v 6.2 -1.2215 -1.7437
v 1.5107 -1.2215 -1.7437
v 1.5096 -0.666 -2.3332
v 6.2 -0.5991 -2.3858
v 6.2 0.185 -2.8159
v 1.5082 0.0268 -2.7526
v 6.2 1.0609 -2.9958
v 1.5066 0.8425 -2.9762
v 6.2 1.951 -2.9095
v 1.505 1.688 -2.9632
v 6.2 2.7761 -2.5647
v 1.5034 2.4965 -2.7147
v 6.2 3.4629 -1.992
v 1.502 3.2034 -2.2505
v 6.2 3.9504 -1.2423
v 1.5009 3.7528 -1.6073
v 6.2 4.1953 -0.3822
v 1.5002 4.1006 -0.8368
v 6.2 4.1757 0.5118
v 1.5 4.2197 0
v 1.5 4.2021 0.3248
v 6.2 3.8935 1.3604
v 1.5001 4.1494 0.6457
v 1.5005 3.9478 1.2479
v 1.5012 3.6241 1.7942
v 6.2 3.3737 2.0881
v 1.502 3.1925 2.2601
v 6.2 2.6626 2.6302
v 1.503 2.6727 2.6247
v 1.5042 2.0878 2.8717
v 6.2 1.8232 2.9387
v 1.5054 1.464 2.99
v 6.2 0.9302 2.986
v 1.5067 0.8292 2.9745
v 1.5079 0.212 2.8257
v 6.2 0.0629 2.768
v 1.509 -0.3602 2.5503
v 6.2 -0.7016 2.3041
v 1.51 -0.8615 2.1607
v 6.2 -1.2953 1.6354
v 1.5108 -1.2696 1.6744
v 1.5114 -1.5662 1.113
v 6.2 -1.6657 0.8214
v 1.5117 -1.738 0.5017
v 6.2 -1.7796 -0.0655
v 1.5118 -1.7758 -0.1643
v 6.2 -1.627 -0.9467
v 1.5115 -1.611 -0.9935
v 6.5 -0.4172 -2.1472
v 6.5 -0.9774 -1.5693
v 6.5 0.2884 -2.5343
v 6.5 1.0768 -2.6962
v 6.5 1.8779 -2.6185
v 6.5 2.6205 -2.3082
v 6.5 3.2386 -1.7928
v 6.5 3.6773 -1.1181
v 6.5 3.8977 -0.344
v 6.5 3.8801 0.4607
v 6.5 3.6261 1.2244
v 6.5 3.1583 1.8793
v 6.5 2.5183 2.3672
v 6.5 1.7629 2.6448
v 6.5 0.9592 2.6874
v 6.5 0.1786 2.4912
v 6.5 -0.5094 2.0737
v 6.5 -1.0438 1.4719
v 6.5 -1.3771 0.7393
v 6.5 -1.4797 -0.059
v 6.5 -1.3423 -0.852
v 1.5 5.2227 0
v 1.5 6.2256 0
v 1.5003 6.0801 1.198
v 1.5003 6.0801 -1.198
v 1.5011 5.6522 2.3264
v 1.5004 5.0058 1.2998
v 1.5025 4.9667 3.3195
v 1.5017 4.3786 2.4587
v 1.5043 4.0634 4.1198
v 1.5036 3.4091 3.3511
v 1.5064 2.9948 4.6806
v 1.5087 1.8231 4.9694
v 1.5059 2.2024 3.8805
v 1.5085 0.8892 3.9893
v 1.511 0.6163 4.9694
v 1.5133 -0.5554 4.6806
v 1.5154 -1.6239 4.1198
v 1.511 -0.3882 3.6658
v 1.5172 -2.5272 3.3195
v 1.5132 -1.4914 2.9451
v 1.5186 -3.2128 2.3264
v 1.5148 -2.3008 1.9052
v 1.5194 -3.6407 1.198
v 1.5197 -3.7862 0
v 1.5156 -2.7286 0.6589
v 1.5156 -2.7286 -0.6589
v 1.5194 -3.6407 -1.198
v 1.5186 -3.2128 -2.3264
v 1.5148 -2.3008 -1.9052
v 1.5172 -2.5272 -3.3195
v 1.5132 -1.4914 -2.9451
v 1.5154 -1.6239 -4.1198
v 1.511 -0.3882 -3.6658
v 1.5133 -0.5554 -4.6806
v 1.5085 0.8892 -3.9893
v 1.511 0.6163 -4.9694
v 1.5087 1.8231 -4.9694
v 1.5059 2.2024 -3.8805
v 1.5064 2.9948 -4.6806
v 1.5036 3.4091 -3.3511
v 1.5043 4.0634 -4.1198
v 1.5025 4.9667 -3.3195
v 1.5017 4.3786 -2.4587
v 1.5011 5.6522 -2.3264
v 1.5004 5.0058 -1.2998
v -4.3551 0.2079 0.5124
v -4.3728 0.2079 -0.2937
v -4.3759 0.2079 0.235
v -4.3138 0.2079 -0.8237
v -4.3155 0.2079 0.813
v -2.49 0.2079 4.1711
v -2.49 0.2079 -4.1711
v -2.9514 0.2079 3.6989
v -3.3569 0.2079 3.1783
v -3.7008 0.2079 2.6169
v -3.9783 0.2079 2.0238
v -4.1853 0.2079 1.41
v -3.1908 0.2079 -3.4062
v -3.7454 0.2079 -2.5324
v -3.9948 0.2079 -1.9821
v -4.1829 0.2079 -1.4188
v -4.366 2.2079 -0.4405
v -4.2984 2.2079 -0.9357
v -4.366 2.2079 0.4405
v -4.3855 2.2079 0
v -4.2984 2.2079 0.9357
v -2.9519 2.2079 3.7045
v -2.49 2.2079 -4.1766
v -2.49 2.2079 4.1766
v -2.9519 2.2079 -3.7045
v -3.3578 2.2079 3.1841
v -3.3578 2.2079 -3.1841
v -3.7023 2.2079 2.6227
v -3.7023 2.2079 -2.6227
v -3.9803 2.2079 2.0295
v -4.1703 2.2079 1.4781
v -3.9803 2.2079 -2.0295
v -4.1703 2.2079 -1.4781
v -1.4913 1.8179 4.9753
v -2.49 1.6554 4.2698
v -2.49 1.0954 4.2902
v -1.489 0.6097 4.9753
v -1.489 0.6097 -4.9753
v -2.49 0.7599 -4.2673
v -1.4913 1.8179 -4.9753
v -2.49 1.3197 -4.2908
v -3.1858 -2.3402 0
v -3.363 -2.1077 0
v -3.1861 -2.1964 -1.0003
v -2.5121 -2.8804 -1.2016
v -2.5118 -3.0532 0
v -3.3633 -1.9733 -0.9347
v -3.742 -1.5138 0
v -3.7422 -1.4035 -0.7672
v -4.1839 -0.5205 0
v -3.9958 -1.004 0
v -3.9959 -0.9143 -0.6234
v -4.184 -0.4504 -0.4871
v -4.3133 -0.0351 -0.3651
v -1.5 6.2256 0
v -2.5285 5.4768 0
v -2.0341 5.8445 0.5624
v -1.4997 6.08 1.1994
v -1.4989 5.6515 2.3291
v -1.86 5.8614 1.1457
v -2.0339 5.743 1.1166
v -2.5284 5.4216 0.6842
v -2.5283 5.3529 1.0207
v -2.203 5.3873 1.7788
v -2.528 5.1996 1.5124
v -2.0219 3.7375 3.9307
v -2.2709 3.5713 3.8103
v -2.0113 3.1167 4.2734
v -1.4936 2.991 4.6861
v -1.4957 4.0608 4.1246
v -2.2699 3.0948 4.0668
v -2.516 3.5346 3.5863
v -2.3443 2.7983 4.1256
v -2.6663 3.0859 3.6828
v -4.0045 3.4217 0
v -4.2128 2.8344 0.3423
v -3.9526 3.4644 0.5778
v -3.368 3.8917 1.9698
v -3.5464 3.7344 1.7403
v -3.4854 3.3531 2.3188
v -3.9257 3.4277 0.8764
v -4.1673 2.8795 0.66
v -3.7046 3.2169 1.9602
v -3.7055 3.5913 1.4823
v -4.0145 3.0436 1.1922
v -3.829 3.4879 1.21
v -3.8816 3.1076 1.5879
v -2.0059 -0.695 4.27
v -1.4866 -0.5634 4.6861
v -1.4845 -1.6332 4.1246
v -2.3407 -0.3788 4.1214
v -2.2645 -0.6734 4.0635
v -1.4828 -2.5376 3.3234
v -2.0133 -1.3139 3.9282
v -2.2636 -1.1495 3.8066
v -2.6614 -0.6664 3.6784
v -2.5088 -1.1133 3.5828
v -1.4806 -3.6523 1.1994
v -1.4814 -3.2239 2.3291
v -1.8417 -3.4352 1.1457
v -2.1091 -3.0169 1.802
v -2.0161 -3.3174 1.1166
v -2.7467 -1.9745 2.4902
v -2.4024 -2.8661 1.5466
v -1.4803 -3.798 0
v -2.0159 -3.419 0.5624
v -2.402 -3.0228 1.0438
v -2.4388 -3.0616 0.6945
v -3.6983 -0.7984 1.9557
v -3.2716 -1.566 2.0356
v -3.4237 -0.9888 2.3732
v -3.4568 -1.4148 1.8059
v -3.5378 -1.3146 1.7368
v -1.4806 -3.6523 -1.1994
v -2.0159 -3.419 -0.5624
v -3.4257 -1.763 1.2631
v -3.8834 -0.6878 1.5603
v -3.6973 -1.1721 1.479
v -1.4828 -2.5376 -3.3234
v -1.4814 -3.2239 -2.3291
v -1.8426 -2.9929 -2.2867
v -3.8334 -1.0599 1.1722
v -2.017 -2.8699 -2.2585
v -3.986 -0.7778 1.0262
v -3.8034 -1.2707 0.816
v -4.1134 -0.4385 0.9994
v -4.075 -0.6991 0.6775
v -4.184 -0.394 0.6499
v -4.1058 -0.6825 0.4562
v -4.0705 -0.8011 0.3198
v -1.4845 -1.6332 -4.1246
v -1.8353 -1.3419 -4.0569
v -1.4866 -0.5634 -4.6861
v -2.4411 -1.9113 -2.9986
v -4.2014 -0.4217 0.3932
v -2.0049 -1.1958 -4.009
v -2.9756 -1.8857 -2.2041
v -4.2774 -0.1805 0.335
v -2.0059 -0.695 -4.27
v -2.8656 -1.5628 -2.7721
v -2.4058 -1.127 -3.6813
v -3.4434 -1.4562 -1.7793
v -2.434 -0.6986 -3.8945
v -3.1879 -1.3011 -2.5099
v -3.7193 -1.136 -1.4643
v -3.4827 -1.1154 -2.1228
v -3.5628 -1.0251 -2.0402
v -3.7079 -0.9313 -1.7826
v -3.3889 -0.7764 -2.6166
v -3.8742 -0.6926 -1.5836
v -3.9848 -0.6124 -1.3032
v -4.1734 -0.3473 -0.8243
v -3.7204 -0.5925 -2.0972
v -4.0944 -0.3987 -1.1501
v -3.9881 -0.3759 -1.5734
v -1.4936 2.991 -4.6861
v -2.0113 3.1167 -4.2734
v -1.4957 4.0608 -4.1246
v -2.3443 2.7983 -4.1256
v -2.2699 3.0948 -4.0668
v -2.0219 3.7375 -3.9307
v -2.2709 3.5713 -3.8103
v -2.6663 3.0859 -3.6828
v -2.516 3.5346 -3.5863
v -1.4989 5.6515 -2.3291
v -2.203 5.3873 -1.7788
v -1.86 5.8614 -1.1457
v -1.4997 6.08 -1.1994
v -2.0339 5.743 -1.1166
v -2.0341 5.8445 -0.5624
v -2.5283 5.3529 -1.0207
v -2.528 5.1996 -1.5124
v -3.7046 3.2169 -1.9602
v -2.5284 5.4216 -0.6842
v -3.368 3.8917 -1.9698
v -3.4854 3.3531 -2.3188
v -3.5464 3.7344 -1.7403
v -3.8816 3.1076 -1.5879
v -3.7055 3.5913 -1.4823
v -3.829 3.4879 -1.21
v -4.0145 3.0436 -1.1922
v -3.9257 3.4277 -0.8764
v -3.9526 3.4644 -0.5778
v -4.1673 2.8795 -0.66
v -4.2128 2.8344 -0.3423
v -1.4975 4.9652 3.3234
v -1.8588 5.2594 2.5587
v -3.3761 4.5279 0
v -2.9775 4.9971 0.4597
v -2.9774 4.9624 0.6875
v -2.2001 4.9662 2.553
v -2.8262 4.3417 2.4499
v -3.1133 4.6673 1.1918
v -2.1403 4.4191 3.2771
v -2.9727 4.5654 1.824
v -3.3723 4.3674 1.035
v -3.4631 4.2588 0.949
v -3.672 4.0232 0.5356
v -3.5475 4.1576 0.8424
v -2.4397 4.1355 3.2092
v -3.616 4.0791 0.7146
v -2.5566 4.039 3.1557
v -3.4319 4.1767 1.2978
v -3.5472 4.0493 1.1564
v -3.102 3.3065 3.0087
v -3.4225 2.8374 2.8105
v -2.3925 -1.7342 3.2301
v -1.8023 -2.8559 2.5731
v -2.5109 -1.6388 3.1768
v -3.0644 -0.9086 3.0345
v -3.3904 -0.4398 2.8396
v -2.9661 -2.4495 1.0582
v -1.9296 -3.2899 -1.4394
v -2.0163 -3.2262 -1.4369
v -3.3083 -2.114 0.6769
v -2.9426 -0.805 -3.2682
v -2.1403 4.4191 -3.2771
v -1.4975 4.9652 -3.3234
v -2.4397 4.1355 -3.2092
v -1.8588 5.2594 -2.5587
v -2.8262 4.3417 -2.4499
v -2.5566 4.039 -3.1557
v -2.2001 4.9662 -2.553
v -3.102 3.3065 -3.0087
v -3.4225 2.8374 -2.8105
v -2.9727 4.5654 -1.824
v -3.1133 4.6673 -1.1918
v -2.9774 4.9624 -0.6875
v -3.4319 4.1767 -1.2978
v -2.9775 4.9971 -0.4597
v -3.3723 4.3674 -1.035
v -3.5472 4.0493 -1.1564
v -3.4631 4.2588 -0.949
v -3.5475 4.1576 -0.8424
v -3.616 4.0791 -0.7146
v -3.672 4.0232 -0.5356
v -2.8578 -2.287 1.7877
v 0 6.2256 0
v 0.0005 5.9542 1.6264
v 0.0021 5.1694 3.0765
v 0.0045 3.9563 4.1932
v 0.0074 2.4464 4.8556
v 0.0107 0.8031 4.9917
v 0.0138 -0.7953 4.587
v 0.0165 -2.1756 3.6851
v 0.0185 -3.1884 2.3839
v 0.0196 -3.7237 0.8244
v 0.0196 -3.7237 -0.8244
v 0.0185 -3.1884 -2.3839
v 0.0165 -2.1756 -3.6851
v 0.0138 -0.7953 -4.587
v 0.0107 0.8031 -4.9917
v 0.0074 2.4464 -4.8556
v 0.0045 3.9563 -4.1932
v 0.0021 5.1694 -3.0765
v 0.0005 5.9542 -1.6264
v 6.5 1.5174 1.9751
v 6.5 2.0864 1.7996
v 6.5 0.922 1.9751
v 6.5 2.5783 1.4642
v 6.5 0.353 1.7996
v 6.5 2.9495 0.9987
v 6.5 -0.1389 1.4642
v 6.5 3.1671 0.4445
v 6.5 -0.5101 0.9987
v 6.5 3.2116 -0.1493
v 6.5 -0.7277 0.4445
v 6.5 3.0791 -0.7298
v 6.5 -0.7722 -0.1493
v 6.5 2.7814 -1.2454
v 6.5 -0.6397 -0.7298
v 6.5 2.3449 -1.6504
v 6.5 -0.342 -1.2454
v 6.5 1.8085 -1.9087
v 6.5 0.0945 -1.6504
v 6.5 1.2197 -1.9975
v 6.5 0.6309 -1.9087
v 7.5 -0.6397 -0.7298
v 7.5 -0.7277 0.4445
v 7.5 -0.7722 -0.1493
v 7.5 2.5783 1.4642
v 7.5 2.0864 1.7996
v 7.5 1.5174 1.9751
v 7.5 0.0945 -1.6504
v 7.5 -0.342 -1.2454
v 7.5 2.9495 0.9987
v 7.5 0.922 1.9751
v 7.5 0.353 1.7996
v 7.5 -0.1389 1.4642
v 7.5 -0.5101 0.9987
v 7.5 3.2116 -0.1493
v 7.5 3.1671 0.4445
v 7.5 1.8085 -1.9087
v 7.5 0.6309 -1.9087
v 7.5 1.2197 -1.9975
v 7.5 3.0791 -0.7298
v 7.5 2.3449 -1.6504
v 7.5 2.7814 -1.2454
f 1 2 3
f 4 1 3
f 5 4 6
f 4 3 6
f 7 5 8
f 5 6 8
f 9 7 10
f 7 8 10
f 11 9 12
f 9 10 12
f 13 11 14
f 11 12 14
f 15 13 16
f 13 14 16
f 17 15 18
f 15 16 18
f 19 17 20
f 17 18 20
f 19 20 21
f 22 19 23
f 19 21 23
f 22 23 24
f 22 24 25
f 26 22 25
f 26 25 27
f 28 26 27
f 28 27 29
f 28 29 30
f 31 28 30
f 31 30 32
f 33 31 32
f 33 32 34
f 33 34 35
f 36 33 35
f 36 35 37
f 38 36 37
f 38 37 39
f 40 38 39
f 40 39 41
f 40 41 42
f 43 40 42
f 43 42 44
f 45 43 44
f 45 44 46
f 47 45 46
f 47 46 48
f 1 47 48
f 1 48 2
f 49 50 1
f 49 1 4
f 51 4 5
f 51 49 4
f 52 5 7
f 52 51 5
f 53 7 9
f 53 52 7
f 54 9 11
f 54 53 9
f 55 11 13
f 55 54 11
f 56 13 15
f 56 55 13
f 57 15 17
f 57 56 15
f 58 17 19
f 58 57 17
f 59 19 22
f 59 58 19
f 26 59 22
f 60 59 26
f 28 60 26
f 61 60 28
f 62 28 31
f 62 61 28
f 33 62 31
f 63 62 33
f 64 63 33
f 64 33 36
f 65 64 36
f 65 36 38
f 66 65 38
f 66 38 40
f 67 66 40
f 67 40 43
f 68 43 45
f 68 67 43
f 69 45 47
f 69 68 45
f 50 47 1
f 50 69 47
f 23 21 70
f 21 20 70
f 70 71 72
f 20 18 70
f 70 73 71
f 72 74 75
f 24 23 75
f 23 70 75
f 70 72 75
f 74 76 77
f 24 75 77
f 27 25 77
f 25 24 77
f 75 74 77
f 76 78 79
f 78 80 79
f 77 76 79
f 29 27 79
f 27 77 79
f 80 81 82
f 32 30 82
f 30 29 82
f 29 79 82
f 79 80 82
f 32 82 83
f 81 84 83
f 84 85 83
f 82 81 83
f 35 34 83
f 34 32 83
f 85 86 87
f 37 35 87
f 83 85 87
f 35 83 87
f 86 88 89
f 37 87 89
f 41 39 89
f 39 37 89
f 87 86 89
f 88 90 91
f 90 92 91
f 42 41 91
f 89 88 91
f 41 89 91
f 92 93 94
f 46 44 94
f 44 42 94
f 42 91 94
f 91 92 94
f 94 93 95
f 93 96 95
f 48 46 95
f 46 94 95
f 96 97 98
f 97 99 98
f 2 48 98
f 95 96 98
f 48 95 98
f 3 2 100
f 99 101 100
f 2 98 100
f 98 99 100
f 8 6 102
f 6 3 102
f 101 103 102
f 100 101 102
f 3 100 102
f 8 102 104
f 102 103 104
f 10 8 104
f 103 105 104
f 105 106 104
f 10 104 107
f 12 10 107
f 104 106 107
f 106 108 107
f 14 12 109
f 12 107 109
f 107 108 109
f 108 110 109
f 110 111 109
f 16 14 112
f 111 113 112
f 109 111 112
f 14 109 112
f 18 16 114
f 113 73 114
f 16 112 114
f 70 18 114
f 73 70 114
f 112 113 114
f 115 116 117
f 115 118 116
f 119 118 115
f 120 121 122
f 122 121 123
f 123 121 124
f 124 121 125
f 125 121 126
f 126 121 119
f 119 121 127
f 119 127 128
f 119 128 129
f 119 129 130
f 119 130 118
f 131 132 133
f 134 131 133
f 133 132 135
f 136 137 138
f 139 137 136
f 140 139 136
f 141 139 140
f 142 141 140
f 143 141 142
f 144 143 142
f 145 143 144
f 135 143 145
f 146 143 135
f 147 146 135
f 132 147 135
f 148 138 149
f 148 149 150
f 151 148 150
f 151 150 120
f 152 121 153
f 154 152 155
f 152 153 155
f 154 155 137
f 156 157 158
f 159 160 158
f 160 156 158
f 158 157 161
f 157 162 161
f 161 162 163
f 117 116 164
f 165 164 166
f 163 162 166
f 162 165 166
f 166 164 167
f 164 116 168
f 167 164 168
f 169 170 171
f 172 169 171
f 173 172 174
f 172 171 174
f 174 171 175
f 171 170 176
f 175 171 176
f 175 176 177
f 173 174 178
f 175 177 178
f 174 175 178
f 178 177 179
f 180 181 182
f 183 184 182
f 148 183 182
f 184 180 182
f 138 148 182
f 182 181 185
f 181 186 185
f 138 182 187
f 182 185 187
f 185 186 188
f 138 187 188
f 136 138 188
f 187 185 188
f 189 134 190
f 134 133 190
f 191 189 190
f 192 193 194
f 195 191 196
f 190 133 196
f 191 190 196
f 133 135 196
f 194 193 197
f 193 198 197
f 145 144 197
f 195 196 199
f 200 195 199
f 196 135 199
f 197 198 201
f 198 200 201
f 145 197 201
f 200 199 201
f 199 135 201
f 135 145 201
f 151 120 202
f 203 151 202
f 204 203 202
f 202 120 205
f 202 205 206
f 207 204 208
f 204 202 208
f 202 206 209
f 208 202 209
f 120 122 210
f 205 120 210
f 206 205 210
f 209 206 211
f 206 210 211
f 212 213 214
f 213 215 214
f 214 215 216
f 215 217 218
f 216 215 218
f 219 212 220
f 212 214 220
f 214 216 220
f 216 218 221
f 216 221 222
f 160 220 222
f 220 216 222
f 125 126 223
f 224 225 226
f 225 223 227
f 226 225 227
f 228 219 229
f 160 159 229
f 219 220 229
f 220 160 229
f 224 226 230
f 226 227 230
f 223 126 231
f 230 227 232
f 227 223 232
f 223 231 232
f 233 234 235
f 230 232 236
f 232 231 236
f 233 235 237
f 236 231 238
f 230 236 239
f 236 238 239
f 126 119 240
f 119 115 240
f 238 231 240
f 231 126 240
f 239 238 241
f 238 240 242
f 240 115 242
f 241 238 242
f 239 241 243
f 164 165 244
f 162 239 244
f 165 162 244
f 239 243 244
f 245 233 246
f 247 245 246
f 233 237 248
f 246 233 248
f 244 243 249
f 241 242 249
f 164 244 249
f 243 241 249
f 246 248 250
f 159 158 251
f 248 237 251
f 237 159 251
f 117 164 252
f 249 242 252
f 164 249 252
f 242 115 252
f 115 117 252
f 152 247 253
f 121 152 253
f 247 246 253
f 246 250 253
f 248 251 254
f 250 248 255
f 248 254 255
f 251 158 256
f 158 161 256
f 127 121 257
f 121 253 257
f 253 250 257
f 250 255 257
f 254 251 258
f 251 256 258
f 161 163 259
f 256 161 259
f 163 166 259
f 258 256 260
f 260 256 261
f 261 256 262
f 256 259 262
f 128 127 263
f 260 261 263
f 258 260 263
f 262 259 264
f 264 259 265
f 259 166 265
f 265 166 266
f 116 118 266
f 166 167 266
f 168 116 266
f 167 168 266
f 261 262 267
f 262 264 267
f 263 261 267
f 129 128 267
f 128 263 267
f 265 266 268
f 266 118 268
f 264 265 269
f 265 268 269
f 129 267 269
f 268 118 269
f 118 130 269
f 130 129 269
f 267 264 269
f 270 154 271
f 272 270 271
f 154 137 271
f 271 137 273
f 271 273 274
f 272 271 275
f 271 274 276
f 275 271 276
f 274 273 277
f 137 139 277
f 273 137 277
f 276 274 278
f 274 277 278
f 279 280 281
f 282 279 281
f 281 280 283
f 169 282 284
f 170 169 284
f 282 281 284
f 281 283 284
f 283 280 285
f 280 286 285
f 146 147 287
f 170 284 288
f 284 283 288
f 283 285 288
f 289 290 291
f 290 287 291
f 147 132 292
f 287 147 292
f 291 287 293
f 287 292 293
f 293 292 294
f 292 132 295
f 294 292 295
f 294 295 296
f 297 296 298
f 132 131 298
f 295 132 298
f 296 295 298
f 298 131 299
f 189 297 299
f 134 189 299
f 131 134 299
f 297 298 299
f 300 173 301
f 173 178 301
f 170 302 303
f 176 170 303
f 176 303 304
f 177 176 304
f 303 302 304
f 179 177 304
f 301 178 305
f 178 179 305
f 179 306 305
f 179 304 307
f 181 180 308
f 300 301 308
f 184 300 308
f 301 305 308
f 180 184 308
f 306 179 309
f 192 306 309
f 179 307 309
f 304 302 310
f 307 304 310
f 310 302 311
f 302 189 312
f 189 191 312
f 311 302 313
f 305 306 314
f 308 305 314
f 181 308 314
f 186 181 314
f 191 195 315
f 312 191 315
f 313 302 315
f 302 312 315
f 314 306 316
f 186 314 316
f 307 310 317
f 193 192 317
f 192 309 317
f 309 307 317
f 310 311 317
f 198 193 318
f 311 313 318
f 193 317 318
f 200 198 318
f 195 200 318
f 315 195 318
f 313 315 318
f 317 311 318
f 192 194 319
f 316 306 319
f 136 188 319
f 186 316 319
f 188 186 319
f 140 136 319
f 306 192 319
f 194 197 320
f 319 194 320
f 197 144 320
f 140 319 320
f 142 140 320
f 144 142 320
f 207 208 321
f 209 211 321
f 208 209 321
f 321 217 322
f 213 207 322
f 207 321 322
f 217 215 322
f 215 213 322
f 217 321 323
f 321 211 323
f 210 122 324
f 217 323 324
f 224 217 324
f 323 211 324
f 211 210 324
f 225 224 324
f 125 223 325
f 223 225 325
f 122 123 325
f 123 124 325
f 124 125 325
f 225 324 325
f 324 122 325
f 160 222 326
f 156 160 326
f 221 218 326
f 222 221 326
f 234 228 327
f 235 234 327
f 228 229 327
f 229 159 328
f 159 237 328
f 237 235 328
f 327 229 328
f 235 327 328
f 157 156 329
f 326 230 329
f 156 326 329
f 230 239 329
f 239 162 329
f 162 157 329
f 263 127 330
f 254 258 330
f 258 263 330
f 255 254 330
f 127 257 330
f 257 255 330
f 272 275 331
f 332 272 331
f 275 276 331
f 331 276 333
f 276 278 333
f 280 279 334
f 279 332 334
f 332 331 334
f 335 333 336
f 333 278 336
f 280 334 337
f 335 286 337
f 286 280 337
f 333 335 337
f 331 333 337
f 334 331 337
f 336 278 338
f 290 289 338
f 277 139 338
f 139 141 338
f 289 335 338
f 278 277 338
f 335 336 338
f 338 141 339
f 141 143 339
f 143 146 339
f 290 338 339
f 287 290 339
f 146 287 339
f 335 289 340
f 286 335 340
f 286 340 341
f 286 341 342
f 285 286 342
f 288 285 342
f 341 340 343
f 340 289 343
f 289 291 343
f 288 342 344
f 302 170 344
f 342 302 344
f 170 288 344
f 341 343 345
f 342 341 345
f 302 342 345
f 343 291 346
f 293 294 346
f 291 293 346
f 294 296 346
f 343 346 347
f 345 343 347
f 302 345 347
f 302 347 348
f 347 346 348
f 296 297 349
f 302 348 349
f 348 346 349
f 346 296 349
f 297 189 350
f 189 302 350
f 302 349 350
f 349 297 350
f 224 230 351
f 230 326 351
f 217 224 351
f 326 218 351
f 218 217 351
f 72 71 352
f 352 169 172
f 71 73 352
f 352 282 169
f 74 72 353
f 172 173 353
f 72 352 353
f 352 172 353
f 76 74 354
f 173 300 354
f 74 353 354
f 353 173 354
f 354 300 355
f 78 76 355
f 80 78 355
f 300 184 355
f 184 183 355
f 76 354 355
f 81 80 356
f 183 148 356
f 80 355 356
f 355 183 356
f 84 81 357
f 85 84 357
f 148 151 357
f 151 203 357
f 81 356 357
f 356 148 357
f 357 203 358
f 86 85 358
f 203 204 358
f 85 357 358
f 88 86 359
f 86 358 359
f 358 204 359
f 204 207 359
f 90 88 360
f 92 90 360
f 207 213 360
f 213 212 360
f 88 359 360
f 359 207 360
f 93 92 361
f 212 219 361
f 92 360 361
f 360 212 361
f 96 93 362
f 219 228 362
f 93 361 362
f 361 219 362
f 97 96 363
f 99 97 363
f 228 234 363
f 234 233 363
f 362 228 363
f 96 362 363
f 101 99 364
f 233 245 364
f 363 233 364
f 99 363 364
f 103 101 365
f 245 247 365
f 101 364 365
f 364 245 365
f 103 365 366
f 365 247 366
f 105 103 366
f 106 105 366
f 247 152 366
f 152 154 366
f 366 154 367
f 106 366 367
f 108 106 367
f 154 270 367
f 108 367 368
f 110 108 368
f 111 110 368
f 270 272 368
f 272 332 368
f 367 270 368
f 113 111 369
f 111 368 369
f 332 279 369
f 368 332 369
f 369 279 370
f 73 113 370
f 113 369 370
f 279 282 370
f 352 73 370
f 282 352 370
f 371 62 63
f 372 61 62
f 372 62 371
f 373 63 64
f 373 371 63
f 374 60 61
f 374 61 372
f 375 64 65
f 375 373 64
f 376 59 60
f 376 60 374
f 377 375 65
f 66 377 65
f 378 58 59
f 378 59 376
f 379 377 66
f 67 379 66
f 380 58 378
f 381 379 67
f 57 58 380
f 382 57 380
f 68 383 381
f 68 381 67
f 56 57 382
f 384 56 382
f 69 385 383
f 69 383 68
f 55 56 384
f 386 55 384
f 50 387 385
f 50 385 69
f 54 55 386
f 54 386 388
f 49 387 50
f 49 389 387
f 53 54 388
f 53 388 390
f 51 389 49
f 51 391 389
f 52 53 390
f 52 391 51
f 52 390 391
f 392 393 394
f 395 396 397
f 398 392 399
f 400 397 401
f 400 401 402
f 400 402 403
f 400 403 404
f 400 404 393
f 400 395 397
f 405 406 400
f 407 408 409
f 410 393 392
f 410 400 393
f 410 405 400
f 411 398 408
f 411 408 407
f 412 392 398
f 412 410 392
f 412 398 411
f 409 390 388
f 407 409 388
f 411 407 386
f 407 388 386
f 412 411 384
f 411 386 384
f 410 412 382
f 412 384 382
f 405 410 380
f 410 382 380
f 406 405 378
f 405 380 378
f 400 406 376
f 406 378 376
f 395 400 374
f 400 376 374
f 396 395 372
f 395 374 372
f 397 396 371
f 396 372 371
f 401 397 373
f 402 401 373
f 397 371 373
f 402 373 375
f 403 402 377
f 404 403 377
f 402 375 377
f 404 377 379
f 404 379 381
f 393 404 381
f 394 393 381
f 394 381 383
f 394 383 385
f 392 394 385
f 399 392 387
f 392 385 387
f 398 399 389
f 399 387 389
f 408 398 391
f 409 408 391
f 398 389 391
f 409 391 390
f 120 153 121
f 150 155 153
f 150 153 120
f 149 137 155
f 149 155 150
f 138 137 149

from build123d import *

# Parameters (mm, degrees)
CUT_EXTRUDE2_DEPTH      = 2
CUT_EXTRUDE2_DEPTH_BACK = 1.81
SKETCH16_W              = 10.023590622
SKETCH16_H              = 2
SKETCH25_R              = 3
BOSS_EXTRUDE4_DEPTH     = 5
CHAMFER1_SIZE           = 0.3
SKETCH43_R              = 1.997454852
BOSS_EXTRUDE6_DEPTH     = 1


with BuildPart() as part:
    # Sketch2 → Revolve2 (revolve)
    with BuildSketch(Plane.XY):
        with BuildLine():
            ThreePointArc((-1.5, 6.225604788), (-3.652462654, 4.106847096), (-4.5, 1.207897271))
            Line((-4.5, 1.207897271), (-1.5, 1.213799777))
            Line((-1.5, 1.213799777), (-1.5, 6.225604788))
        make_face()
        Polygon((-1.5, 6.225604788), (-1.5, 1.213799777), (1.5, 1.219702283), (1.5, 6.225604788), align=None)
    revolve(axis=Axis((-4.5, 1.207897271, 0), (0.9999980644737863, 0.0019674980765590857, 0)))

    # Sketch16 → Cut-Extrude2 (cut, two sides: drawn at the far end of the back side and taken through both)
    with BuildSketch(Plane.ZY.offset(4.3).offset(-CUT_EXTRUDE2_DEPTH_BACK)):
        with Locations((0, 1.207897271)):
            Rectangle(SKETCH16_W, SKETCH16_H)
    extrude(amount=CUT_EXTRUDE2_DEPTH + CUT_EXTRUDE2_DEPTH_BACK, mode=Mode.SUBTRACT)

    # Sketch25 → Boss-Extrude4 (add)
    with BuildSketch(Plane(origin=(1.5, 0, 0), x_dir=(0, 0, -1), z_dir=(1, 0, 0))):
        with Locations(Location((0, 1.219702283, 0), (0, 0, 305.537696461))):
            Circle(SKETCH25_R)
    extrude(amount=BOSS_EXTRUDE4_DEPTH)

    # Chamfer1
    chamfer1_edges = [part.edges().sort_by_distance(p)[0] for p in [
        (6.5, 3.660902128, 1.743715377),
    ]]
    chamfer(chamfer1_edges, length=CHAMFER1_SIZE)

    # Sketch43 → Boss-Extrude6 (add)
    with BuildSketch(Plane(origin=(6.5, 0, 0), x_dir=(0, 0, -1), z_dir=(1, 0, 0))):
        with Locations((0, 1.219702283)):
            Circle(SKETCH43_R)
    extrude(amount=BOSS_EXTRUDE6_DEPTH)


solid = part.part
